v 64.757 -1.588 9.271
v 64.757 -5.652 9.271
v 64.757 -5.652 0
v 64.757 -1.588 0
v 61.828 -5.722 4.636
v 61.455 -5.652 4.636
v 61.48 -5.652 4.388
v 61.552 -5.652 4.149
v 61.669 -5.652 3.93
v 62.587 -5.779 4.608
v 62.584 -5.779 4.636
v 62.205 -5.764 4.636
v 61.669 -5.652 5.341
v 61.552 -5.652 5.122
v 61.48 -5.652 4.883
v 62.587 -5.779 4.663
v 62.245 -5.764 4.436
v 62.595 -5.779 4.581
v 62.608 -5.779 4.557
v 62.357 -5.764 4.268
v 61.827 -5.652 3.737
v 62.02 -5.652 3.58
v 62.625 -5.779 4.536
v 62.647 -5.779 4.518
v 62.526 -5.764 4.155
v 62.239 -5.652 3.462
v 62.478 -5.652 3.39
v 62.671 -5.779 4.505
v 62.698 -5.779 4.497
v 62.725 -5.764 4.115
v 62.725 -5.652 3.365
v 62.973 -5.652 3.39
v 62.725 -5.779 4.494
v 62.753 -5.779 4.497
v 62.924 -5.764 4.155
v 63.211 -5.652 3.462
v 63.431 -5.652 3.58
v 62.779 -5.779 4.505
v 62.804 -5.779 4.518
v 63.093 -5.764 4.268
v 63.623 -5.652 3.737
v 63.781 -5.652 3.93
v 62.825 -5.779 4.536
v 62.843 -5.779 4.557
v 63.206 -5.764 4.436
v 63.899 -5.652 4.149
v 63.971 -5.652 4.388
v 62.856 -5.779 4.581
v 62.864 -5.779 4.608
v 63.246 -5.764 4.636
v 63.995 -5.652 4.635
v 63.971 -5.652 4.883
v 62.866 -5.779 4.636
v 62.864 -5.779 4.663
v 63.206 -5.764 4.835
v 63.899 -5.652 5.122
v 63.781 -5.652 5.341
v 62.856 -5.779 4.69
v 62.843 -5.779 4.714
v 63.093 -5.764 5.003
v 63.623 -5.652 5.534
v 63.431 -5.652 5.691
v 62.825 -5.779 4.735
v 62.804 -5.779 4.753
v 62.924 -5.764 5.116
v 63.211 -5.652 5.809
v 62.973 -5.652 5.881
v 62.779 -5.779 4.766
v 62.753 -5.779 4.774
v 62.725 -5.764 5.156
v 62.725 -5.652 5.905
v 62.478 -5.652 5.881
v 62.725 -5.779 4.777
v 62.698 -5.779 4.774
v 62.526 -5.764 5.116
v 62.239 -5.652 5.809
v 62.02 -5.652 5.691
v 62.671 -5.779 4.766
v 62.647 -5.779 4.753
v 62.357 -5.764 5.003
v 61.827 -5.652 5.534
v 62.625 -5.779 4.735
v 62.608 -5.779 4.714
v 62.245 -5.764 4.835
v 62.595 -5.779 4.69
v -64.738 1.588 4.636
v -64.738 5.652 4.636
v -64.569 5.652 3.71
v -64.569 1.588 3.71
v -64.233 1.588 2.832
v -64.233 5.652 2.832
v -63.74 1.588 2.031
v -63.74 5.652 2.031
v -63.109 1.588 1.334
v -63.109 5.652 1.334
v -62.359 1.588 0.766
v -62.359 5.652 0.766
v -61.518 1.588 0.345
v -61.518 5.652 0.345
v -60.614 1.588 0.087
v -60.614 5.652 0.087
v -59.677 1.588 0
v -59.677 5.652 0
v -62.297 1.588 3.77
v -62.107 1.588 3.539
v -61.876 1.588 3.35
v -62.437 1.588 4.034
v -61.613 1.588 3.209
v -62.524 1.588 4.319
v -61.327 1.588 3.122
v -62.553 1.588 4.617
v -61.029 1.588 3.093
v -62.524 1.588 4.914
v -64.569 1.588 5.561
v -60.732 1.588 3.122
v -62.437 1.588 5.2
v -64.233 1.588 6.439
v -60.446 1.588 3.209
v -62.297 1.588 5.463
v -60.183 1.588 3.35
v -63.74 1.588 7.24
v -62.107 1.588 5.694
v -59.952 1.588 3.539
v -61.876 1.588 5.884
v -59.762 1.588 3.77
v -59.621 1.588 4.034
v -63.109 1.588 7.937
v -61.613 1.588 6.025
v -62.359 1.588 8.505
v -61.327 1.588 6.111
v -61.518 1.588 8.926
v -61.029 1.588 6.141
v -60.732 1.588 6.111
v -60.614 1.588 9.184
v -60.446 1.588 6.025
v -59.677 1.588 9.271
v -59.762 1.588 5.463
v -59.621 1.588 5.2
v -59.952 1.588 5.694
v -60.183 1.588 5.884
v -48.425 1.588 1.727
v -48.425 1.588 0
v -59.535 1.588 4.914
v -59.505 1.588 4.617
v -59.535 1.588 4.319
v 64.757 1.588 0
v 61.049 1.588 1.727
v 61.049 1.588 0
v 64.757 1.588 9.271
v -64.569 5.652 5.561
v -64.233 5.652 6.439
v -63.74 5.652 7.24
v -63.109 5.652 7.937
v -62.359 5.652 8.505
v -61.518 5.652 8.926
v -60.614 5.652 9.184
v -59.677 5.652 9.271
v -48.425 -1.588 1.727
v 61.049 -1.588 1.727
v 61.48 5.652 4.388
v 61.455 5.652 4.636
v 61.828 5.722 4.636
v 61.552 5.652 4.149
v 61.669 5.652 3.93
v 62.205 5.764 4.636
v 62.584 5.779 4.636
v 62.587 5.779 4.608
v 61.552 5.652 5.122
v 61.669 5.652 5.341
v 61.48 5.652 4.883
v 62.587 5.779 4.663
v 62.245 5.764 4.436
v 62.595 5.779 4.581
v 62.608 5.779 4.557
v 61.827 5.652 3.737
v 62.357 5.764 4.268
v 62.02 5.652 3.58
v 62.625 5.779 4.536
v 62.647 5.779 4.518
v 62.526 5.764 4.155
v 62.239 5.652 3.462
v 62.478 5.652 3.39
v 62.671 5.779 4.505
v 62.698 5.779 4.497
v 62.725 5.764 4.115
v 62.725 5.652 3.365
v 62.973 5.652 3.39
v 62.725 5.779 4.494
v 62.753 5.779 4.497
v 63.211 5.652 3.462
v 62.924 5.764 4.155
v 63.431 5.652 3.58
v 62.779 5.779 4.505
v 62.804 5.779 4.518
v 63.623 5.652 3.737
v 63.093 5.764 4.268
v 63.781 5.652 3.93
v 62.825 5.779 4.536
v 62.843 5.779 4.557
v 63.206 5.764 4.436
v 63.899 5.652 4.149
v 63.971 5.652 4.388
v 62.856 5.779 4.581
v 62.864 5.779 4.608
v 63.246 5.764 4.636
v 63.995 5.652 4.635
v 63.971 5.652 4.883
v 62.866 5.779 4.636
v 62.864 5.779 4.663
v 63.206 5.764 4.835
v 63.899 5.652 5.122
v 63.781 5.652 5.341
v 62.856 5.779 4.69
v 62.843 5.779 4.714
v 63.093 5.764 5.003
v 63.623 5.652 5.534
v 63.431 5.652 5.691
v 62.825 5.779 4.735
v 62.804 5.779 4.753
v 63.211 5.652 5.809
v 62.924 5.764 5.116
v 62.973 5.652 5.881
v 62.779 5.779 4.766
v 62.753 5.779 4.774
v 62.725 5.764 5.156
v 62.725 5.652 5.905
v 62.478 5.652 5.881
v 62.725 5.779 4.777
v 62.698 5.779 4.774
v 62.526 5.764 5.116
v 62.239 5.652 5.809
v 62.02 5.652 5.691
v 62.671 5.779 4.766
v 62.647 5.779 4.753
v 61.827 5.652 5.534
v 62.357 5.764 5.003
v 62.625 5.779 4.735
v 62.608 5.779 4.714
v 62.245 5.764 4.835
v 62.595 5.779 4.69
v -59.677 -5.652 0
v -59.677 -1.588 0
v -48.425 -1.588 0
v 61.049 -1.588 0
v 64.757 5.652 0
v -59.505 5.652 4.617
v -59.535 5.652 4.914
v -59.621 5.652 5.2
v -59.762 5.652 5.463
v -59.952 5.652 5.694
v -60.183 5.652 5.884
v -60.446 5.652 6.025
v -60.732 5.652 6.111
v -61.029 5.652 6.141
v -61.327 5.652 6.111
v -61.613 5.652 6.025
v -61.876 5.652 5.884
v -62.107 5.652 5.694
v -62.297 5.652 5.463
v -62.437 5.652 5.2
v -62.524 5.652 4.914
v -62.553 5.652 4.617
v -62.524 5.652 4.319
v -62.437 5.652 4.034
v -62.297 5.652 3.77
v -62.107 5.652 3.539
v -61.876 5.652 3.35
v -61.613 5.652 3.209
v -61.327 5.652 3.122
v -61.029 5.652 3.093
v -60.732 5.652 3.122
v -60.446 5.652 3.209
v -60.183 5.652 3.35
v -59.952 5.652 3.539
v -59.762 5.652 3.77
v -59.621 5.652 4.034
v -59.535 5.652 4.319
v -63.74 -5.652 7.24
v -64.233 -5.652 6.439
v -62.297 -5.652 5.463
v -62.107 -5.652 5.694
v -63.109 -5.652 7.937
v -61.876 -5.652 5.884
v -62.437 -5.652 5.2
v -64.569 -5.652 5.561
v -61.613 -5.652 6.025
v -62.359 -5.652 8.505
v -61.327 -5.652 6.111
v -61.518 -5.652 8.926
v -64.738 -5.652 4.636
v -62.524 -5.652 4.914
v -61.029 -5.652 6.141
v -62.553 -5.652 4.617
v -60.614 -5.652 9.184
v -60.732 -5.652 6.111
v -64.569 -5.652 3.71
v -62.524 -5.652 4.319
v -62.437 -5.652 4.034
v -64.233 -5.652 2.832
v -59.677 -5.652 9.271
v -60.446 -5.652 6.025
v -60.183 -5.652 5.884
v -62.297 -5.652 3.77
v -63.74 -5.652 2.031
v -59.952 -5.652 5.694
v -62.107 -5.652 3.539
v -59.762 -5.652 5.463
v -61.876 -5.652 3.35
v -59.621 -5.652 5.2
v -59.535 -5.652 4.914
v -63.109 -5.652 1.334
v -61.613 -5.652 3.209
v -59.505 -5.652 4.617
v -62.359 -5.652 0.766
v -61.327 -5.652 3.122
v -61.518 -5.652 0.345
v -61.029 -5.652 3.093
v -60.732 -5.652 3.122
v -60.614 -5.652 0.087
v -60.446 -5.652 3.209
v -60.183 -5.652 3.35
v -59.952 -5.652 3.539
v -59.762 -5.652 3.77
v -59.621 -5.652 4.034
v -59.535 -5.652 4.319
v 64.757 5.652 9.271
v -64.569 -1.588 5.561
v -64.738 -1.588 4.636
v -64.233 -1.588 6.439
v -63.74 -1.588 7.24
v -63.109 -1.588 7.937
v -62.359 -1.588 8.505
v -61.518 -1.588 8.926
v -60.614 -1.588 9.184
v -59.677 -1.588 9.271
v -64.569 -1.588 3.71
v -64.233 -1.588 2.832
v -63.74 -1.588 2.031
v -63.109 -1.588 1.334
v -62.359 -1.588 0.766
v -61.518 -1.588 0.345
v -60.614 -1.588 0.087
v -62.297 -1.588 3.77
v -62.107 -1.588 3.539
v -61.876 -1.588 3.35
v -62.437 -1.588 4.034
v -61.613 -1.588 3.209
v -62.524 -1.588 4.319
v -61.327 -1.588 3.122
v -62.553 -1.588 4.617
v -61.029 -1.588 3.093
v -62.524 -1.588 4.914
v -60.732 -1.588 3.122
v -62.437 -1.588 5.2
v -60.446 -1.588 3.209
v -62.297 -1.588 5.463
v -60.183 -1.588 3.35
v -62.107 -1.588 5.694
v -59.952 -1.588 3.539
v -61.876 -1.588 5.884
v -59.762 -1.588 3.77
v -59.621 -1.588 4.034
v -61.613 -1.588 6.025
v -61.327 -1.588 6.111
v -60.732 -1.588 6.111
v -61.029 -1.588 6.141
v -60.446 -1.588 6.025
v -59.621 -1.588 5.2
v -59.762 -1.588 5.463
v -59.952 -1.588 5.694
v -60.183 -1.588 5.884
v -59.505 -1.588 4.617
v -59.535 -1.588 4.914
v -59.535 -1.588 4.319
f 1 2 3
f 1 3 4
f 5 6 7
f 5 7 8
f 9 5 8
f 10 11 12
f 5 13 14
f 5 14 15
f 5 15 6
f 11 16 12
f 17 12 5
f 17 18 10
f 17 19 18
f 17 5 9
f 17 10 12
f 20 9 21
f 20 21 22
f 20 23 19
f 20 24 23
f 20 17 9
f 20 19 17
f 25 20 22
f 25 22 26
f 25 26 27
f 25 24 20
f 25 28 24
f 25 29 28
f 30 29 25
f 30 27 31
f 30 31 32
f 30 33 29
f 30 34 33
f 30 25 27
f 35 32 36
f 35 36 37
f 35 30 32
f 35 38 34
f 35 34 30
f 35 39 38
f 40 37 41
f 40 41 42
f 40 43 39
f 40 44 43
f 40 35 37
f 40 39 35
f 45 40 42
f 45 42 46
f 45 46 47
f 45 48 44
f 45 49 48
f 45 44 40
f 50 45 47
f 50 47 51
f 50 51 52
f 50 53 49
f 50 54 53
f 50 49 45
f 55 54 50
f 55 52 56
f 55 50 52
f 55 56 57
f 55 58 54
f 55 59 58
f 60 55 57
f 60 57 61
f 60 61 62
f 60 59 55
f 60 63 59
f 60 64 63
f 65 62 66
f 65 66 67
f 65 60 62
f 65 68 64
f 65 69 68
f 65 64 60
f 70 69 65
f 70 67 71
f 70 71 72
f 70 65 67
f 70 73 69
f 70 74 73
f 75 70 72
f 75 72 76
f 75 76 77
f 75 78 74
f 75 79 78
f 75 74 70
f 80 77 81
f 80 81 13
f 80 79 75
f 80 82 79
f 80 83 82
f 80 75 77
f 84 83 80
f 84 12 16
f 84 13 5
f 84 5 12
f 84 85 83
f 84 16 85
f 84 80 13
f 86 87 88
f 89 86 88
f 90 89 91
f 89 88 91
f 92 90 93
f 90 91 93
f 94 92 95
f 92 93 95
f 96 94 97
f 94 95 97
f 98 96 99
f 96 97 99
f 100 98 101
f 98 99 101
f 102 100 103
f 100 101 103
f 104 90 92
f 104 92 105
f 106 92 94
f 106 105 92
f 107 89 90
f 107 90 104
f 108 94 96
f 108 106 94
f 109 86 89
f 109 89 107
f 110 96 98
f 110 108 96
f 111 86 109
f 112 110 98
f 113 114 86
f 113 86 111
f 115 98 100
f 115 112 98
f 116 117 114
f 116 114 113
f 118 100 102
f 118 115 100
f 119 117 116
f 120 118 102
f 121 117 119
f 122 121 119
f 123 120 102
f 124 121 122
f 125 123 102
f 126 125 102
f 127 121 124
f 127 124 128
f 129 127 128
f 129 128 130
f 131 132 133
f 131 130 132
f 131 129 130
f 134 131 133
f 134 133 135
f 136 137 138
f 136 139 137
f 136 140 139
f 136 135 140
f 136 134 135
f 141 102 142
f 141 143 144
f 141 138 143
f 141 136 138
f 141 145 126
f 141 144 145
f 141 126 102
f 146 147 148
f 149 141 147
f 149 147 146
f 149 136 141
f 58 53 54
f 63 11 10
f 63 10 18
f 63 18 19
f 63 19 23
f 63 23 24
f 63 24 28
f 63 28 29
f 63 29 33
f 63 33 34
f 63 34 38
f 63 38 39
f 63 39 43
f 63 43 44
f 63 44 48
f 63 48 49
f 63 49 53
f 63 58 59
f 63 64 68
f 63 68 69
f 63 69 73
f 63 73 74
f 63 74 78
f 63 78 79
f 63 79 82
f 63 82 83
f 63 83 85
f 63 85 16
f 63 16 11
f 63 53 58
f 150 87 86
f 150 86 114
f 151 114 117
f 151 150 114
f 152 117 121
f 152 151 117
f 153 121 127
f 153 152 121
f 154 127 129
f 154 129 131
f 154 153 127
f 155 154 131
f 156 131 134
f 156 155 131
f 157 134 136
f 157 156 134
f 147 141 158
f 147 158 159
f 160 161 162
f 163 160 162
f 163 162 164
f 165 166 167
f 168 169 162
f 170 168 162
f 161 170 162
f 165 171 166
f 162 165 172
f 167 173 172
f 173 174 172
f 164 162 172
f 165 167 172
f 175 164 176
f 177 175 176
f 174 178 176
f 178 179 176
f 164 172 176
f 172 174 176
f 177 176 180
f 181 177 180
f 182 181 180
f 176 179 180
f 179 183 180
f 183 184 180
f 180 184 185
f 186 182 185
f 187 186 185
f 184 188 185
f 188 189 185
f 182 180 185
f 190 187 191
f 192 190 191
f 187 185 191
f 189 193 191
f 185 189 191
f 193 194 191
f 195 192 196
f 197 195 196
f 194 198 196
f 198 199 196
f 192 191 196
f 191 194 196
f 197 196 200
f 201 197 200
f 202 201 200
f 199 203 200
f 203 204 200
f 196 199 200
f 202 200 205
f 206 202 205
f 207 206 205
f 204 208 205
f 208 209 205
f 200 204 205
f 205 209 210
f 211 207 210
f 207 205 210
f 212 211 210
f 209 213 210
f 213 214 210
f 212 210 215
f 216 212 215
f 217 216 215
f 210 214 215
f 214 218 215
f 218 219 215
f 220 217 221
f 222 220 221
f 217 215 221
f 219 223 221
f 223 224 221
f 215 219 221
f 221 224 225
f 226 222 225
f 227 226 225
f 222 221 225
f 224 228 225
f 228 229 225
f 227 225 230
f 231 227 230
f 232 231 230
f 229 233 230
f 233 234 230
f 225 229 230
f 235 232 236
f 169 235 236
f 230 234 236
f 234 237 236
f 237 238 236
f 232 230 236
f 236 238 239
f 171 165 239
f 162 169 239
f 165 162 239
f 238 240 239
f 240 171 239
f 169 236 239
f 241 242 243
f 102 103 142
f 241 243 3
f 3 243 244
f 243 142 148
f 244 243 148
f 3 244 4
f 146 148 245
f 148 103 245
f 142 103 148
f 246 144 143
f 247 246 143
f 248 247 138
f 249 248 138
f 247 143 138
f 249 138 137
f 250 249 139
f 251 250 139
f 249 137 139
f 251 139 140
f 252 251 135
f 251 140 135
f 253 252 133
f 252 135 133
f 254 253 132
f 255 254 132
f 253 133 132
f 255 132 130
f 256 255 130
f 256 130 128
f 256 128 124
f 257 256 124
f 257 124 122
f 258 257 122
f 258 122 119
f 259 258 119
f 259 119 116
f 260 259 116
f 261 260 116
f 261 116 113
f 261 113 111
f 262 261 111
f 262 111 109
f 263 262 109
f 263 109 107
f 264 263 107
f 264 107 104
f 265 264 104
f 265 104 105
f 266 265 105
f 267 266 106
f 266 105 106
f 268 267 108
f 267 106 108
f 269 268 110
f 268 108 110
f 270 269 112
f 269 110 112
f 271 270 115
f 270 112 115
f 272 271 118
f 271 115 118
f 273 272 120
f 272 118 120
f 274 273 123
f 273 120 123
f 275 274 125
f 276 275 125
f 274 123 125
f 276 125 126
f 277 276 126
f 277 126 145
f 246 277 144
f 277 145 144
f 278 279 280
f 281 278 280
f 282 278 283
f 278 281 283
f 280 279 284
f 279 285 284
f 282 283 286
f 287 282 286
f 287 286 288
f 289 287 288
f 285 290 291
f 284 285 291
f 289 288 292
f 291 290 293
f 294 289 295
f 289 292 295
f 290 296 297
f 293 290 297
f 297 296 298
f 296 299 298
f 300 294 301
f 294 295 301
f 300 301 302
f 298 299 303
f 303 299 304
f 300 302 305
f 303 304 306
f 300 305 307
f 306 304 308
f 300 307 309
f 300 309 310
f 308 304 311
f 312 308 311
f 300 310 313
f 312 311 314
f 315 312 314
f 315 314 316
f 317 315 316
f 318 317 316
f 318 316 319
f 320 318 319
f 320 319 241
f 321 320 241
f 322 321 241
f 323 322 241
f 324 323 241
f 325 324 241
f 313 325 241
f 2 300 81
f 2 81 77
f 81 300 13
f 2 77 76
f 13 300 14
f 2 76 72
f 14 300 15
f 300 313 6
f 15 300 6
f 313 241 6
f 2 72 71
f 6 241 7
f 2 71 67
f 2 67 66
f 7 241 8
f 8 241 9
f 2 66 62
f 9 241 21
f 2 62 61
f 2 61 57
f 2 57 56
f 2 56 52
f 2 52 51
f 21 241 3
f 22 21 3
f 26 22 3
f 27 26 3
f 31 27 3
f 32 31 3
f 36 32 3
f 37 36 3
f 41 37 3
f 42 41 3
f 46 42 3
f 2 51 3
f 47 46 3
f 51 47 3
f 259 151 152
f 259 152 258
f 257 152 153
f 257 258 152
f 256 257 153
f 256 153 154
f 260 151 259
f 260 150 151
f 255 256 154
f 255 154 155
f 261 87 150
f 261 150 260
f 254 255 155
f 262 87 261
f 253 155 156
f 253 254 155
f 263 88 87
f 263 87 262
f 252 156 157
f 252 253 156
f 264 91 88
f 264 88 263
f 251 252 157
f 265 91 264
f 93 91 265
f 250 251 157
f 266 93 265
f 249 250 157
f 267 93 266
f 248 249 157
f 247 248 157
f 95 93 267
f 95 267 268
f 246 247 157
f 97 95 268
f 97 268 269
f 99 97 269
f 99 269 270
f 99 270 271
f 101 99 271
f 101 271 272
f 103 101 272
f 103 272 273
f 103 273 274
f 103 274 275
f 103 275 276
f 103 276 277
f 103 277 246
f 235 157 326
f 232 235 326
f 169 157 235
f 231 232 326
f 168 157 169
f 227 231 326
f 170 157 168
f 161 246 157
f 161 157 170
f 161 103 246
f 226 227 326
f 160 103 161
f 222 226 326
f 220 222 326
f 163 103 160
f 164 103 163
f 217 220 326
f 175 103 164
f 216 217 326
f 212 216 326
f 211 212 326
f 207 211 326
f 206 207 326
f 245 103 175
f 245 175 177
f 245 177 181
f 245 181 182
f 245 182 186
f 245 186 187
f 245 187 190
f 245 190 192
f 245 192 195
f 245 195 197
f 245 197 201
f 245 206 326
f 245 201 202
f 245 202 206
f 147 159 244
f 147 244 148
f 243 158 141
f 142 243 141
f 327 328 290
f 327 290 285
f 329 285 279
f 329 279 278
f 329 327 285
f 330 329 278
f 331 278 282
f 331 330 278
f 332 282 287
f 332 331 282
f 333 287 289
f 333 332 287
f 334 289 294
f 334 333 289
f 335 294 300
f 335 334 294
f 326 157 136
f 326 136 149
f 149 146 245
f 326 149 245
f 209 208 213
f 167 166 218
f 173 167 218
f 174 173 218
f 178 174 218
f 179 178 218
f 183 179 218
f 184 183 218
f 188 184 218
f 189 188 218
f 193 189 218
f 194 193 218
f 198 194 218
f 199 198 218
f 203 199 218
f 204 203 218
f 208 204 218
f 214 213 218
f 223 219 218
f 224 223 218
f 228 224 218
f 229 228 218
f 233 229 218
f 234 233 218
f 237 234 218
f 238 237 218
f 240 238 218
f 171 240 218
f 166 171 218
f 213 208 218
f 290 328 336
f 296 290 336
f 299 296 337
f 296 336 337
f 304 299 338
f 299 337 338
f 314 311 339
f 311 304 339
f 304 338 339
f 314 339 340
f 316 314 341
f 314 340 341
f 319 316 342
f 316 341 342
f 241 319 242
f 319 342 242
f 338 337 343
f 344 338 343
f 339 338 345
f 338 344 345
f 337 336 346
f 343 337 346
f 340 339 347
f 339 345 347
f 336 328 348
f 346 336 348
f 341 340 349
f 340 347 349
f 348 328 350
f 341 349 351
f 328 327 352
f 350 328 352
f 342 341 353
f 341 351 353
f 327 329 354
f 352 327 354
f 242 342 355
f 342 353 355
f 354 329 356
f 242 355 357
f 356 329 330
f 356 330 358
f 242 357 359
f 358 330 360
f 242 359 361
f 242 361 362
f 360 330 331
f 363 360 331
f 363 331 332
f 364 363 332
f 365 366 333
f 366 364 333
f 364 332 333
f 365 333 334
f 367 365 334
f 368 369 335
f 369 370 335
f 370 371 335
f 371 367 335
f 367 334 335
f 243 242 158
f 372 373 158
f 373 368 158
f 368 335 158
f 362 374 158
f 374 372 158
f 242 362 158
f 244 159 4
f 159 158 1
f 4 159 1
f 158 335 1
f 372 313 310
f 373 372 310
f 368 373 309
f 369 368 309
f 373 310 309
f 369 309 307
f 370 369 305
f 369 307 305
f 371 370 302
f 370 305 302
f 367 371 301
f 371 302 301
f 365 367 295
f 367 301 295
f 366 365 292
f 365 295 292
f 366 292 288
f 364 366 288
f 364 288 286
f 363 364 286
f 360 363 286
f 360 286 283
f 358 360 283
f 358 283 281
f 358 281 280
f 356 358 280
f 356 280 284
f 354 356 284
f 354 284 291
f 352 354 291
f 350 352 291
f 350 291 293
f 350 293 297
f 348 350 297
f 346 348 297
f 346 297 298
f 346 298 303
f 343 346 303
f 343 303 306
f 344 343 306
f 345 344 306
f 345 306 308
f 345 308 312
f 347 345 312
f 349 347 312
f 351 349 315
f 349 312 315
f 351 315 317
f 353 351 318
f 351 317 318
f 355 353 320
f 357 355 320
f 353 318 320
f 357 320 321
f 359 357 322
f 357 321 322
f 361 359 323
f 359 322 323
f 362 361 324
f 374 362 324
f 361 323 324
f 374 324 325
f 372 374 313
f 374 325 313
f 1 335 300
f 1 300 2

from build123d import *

# Parameters (mm, degrees)
F0_W        = 129.5146
F0_H        = 11.303
F1_DEPTH    = 9.271
F2_W        = 206.3660303733
F2_H        = 3.175
F3_DEPTH    = 7.5438
F4_W        = 3.7084
F4_H        = 3.175
F5_DEPTH    = 25.4
F6_W        = 16.3322
F6_H        = 3.175
F7_DEPTH    = 25.4
F8_T1_DEPTH = 29.464
F8_T3_DEPTH = 29.464
F9_R        = 1.524
F10_DEPTH   = 25.4
F12_DEPTH   = 0.127


# Not quite as in the source:
# - a fillet or chamfer that OpenCascade refuses, or shapes differently, is made with other operations: its cross-section is extruded or revolved along the edge and cut away or added


with BuildPart() as f1:
    # F0 (on Top) → F1 (new body)
    with BuildSketch(Plane.XY):
        Rectangle(F0_W, F0_H)
    extrude(amount=F1_DEPTH)

    # F2 (on face) → F3 (cut)
    with BuildSketch(Plane.XY.offset(9.271)):
        Rectangle(F2_W, F2_H)
    extrude(amount=-F3_DEPTH, mode=Mode.SUBTRACT)

    # F4 (on face) → F5 (cut)
    with BuildSketch(Plane.XY.offset(1.7272)):
        with Locations((62.9031, 0)):
            Rectangle(F4_W, F4_H)
    extrude(amount=-F5_DEPTH, mode=Mode.SUBTRACT)

    # F6 (on face) → F7 (cut)
    with BuildSketch(Plane.XY.offset(1.7272)):
        with Locations((-56.5912, 0)):
            Rectangle(F6_W, F6_H)
    extrude(amount=-F7_DEPTH, mode=Mode.SUBTRACT)

    # F8: fillet of radius 5.08 on 4 edges, made by hand

    # F8_s2 → F8_t1 (cut)
    with BuildSketch(Plane.XZ.offset(-11.1125)):
        with BuildLine():
            ThreePointArc((-64.7573, 4.191), (-63.2694024484, 7.7831024484), (-59.6773, 9.271))
            Line((-59.6773, 9.271), (-64.7573, 9.271))
            Line((-64.7573, 9.271), (-64.7573, 4.191))
        make_face()
        with BuildLine():
            ThreePointArc((-64.7573, 5.08), (-63.2694024484, 1.4878975516), (-59.6773, 0))
            Line((-59.6773, 0), (-64.7573, 0))
            Line((-64.7573, 0), (-64.7573, 5.08))
        make_face()
    extrude(amount=F8_T1_DEPTH, mode=Mode.SUBTRACT)

    # F8_s4 → F8_t3 (cut)
    with BuildSketch(Plane.XZ.offset(-18.3515)):
        with BuildLine():
            ThreePointArc((-59.6773, 9.271), (-63.2694024484, 7.7831024484), (-64.7573, 4.191))
            Line((-64.7573, 4.191), (-64.7573, 9.271))
            Line((-64.7573, 9.271), (-59.6773, 9.271))
        make_face()
        with BuildLine():
            ThreePointArc((-64.7573, 5.08), (-63.2694024484, 1.4878975516), (-59.6773, 0))
            Line((-59.6773, 0), (-64.7573, 0))
            Line((-64.7573, 0), (-64.7573, 5.08))
        make_face()
    extrude(amount=F8_T3_DEPTH, mode=Mode.SUBTRACT)

    # F9 (on face) → F10 (cut)
    with BuildSketch(Plane.XZ.offset(5.6515)):
        with Locations((-61.0294157593, 4.6167229302)):
            Circle(F9_R)
    extrude(amount=-F10_DEPTH, mode=Mode.SUBTRACT)

    # F11 (on face) → F12 (join)
    with BuildSketch(Plane.XZ.offset(5.6515)):
        with BuildLine():
            Line((61.4553, 4.6355), (63.9953, 4.6355))
            ThreePointArc((63.9953, 4.6355), (62.7253, 5.9055), (61.4553, 4.6355))
        make_face()
        with BuildLine():
            ThreePointArc((61.4553, 4.6355), (62.7253, 3.3655), (63.9953, 4.6355))
            Line((63.9953, 4.6355), (61.4553, 4.6355))
        make_face()
    extrude(amount=F12_DEPTH)

    # F13: fillet of radius 5.08 on 1 edges, made by hand

    # F13_s1 → F13_t2 (revolve, cut)
    with BuildSketch(Plane.XY.offset(4.6355)):
        with BuildLine():
            ThreePointArc((61.4553, -5.6515), (62.0161394247, -5.7466501562), (62.584100691, -5.7785))
            Line((62.584100691, -5.7785), (61.4553, -5.7785))
            Line((61.4553, -5.7785), (61.4553, -5.6515))
        make_face()
    revolve(axis=Axis((62.7253, -5.7785, 4.6355), (0, -1, 0)), mode=Mode.SUBTRACT)

    # F14: F1 across plane


with BuildPart() as f1_1:
    add(f1.part)
    add(f1.part.mirror(Plane.XZ))


solid = f1_1.part
